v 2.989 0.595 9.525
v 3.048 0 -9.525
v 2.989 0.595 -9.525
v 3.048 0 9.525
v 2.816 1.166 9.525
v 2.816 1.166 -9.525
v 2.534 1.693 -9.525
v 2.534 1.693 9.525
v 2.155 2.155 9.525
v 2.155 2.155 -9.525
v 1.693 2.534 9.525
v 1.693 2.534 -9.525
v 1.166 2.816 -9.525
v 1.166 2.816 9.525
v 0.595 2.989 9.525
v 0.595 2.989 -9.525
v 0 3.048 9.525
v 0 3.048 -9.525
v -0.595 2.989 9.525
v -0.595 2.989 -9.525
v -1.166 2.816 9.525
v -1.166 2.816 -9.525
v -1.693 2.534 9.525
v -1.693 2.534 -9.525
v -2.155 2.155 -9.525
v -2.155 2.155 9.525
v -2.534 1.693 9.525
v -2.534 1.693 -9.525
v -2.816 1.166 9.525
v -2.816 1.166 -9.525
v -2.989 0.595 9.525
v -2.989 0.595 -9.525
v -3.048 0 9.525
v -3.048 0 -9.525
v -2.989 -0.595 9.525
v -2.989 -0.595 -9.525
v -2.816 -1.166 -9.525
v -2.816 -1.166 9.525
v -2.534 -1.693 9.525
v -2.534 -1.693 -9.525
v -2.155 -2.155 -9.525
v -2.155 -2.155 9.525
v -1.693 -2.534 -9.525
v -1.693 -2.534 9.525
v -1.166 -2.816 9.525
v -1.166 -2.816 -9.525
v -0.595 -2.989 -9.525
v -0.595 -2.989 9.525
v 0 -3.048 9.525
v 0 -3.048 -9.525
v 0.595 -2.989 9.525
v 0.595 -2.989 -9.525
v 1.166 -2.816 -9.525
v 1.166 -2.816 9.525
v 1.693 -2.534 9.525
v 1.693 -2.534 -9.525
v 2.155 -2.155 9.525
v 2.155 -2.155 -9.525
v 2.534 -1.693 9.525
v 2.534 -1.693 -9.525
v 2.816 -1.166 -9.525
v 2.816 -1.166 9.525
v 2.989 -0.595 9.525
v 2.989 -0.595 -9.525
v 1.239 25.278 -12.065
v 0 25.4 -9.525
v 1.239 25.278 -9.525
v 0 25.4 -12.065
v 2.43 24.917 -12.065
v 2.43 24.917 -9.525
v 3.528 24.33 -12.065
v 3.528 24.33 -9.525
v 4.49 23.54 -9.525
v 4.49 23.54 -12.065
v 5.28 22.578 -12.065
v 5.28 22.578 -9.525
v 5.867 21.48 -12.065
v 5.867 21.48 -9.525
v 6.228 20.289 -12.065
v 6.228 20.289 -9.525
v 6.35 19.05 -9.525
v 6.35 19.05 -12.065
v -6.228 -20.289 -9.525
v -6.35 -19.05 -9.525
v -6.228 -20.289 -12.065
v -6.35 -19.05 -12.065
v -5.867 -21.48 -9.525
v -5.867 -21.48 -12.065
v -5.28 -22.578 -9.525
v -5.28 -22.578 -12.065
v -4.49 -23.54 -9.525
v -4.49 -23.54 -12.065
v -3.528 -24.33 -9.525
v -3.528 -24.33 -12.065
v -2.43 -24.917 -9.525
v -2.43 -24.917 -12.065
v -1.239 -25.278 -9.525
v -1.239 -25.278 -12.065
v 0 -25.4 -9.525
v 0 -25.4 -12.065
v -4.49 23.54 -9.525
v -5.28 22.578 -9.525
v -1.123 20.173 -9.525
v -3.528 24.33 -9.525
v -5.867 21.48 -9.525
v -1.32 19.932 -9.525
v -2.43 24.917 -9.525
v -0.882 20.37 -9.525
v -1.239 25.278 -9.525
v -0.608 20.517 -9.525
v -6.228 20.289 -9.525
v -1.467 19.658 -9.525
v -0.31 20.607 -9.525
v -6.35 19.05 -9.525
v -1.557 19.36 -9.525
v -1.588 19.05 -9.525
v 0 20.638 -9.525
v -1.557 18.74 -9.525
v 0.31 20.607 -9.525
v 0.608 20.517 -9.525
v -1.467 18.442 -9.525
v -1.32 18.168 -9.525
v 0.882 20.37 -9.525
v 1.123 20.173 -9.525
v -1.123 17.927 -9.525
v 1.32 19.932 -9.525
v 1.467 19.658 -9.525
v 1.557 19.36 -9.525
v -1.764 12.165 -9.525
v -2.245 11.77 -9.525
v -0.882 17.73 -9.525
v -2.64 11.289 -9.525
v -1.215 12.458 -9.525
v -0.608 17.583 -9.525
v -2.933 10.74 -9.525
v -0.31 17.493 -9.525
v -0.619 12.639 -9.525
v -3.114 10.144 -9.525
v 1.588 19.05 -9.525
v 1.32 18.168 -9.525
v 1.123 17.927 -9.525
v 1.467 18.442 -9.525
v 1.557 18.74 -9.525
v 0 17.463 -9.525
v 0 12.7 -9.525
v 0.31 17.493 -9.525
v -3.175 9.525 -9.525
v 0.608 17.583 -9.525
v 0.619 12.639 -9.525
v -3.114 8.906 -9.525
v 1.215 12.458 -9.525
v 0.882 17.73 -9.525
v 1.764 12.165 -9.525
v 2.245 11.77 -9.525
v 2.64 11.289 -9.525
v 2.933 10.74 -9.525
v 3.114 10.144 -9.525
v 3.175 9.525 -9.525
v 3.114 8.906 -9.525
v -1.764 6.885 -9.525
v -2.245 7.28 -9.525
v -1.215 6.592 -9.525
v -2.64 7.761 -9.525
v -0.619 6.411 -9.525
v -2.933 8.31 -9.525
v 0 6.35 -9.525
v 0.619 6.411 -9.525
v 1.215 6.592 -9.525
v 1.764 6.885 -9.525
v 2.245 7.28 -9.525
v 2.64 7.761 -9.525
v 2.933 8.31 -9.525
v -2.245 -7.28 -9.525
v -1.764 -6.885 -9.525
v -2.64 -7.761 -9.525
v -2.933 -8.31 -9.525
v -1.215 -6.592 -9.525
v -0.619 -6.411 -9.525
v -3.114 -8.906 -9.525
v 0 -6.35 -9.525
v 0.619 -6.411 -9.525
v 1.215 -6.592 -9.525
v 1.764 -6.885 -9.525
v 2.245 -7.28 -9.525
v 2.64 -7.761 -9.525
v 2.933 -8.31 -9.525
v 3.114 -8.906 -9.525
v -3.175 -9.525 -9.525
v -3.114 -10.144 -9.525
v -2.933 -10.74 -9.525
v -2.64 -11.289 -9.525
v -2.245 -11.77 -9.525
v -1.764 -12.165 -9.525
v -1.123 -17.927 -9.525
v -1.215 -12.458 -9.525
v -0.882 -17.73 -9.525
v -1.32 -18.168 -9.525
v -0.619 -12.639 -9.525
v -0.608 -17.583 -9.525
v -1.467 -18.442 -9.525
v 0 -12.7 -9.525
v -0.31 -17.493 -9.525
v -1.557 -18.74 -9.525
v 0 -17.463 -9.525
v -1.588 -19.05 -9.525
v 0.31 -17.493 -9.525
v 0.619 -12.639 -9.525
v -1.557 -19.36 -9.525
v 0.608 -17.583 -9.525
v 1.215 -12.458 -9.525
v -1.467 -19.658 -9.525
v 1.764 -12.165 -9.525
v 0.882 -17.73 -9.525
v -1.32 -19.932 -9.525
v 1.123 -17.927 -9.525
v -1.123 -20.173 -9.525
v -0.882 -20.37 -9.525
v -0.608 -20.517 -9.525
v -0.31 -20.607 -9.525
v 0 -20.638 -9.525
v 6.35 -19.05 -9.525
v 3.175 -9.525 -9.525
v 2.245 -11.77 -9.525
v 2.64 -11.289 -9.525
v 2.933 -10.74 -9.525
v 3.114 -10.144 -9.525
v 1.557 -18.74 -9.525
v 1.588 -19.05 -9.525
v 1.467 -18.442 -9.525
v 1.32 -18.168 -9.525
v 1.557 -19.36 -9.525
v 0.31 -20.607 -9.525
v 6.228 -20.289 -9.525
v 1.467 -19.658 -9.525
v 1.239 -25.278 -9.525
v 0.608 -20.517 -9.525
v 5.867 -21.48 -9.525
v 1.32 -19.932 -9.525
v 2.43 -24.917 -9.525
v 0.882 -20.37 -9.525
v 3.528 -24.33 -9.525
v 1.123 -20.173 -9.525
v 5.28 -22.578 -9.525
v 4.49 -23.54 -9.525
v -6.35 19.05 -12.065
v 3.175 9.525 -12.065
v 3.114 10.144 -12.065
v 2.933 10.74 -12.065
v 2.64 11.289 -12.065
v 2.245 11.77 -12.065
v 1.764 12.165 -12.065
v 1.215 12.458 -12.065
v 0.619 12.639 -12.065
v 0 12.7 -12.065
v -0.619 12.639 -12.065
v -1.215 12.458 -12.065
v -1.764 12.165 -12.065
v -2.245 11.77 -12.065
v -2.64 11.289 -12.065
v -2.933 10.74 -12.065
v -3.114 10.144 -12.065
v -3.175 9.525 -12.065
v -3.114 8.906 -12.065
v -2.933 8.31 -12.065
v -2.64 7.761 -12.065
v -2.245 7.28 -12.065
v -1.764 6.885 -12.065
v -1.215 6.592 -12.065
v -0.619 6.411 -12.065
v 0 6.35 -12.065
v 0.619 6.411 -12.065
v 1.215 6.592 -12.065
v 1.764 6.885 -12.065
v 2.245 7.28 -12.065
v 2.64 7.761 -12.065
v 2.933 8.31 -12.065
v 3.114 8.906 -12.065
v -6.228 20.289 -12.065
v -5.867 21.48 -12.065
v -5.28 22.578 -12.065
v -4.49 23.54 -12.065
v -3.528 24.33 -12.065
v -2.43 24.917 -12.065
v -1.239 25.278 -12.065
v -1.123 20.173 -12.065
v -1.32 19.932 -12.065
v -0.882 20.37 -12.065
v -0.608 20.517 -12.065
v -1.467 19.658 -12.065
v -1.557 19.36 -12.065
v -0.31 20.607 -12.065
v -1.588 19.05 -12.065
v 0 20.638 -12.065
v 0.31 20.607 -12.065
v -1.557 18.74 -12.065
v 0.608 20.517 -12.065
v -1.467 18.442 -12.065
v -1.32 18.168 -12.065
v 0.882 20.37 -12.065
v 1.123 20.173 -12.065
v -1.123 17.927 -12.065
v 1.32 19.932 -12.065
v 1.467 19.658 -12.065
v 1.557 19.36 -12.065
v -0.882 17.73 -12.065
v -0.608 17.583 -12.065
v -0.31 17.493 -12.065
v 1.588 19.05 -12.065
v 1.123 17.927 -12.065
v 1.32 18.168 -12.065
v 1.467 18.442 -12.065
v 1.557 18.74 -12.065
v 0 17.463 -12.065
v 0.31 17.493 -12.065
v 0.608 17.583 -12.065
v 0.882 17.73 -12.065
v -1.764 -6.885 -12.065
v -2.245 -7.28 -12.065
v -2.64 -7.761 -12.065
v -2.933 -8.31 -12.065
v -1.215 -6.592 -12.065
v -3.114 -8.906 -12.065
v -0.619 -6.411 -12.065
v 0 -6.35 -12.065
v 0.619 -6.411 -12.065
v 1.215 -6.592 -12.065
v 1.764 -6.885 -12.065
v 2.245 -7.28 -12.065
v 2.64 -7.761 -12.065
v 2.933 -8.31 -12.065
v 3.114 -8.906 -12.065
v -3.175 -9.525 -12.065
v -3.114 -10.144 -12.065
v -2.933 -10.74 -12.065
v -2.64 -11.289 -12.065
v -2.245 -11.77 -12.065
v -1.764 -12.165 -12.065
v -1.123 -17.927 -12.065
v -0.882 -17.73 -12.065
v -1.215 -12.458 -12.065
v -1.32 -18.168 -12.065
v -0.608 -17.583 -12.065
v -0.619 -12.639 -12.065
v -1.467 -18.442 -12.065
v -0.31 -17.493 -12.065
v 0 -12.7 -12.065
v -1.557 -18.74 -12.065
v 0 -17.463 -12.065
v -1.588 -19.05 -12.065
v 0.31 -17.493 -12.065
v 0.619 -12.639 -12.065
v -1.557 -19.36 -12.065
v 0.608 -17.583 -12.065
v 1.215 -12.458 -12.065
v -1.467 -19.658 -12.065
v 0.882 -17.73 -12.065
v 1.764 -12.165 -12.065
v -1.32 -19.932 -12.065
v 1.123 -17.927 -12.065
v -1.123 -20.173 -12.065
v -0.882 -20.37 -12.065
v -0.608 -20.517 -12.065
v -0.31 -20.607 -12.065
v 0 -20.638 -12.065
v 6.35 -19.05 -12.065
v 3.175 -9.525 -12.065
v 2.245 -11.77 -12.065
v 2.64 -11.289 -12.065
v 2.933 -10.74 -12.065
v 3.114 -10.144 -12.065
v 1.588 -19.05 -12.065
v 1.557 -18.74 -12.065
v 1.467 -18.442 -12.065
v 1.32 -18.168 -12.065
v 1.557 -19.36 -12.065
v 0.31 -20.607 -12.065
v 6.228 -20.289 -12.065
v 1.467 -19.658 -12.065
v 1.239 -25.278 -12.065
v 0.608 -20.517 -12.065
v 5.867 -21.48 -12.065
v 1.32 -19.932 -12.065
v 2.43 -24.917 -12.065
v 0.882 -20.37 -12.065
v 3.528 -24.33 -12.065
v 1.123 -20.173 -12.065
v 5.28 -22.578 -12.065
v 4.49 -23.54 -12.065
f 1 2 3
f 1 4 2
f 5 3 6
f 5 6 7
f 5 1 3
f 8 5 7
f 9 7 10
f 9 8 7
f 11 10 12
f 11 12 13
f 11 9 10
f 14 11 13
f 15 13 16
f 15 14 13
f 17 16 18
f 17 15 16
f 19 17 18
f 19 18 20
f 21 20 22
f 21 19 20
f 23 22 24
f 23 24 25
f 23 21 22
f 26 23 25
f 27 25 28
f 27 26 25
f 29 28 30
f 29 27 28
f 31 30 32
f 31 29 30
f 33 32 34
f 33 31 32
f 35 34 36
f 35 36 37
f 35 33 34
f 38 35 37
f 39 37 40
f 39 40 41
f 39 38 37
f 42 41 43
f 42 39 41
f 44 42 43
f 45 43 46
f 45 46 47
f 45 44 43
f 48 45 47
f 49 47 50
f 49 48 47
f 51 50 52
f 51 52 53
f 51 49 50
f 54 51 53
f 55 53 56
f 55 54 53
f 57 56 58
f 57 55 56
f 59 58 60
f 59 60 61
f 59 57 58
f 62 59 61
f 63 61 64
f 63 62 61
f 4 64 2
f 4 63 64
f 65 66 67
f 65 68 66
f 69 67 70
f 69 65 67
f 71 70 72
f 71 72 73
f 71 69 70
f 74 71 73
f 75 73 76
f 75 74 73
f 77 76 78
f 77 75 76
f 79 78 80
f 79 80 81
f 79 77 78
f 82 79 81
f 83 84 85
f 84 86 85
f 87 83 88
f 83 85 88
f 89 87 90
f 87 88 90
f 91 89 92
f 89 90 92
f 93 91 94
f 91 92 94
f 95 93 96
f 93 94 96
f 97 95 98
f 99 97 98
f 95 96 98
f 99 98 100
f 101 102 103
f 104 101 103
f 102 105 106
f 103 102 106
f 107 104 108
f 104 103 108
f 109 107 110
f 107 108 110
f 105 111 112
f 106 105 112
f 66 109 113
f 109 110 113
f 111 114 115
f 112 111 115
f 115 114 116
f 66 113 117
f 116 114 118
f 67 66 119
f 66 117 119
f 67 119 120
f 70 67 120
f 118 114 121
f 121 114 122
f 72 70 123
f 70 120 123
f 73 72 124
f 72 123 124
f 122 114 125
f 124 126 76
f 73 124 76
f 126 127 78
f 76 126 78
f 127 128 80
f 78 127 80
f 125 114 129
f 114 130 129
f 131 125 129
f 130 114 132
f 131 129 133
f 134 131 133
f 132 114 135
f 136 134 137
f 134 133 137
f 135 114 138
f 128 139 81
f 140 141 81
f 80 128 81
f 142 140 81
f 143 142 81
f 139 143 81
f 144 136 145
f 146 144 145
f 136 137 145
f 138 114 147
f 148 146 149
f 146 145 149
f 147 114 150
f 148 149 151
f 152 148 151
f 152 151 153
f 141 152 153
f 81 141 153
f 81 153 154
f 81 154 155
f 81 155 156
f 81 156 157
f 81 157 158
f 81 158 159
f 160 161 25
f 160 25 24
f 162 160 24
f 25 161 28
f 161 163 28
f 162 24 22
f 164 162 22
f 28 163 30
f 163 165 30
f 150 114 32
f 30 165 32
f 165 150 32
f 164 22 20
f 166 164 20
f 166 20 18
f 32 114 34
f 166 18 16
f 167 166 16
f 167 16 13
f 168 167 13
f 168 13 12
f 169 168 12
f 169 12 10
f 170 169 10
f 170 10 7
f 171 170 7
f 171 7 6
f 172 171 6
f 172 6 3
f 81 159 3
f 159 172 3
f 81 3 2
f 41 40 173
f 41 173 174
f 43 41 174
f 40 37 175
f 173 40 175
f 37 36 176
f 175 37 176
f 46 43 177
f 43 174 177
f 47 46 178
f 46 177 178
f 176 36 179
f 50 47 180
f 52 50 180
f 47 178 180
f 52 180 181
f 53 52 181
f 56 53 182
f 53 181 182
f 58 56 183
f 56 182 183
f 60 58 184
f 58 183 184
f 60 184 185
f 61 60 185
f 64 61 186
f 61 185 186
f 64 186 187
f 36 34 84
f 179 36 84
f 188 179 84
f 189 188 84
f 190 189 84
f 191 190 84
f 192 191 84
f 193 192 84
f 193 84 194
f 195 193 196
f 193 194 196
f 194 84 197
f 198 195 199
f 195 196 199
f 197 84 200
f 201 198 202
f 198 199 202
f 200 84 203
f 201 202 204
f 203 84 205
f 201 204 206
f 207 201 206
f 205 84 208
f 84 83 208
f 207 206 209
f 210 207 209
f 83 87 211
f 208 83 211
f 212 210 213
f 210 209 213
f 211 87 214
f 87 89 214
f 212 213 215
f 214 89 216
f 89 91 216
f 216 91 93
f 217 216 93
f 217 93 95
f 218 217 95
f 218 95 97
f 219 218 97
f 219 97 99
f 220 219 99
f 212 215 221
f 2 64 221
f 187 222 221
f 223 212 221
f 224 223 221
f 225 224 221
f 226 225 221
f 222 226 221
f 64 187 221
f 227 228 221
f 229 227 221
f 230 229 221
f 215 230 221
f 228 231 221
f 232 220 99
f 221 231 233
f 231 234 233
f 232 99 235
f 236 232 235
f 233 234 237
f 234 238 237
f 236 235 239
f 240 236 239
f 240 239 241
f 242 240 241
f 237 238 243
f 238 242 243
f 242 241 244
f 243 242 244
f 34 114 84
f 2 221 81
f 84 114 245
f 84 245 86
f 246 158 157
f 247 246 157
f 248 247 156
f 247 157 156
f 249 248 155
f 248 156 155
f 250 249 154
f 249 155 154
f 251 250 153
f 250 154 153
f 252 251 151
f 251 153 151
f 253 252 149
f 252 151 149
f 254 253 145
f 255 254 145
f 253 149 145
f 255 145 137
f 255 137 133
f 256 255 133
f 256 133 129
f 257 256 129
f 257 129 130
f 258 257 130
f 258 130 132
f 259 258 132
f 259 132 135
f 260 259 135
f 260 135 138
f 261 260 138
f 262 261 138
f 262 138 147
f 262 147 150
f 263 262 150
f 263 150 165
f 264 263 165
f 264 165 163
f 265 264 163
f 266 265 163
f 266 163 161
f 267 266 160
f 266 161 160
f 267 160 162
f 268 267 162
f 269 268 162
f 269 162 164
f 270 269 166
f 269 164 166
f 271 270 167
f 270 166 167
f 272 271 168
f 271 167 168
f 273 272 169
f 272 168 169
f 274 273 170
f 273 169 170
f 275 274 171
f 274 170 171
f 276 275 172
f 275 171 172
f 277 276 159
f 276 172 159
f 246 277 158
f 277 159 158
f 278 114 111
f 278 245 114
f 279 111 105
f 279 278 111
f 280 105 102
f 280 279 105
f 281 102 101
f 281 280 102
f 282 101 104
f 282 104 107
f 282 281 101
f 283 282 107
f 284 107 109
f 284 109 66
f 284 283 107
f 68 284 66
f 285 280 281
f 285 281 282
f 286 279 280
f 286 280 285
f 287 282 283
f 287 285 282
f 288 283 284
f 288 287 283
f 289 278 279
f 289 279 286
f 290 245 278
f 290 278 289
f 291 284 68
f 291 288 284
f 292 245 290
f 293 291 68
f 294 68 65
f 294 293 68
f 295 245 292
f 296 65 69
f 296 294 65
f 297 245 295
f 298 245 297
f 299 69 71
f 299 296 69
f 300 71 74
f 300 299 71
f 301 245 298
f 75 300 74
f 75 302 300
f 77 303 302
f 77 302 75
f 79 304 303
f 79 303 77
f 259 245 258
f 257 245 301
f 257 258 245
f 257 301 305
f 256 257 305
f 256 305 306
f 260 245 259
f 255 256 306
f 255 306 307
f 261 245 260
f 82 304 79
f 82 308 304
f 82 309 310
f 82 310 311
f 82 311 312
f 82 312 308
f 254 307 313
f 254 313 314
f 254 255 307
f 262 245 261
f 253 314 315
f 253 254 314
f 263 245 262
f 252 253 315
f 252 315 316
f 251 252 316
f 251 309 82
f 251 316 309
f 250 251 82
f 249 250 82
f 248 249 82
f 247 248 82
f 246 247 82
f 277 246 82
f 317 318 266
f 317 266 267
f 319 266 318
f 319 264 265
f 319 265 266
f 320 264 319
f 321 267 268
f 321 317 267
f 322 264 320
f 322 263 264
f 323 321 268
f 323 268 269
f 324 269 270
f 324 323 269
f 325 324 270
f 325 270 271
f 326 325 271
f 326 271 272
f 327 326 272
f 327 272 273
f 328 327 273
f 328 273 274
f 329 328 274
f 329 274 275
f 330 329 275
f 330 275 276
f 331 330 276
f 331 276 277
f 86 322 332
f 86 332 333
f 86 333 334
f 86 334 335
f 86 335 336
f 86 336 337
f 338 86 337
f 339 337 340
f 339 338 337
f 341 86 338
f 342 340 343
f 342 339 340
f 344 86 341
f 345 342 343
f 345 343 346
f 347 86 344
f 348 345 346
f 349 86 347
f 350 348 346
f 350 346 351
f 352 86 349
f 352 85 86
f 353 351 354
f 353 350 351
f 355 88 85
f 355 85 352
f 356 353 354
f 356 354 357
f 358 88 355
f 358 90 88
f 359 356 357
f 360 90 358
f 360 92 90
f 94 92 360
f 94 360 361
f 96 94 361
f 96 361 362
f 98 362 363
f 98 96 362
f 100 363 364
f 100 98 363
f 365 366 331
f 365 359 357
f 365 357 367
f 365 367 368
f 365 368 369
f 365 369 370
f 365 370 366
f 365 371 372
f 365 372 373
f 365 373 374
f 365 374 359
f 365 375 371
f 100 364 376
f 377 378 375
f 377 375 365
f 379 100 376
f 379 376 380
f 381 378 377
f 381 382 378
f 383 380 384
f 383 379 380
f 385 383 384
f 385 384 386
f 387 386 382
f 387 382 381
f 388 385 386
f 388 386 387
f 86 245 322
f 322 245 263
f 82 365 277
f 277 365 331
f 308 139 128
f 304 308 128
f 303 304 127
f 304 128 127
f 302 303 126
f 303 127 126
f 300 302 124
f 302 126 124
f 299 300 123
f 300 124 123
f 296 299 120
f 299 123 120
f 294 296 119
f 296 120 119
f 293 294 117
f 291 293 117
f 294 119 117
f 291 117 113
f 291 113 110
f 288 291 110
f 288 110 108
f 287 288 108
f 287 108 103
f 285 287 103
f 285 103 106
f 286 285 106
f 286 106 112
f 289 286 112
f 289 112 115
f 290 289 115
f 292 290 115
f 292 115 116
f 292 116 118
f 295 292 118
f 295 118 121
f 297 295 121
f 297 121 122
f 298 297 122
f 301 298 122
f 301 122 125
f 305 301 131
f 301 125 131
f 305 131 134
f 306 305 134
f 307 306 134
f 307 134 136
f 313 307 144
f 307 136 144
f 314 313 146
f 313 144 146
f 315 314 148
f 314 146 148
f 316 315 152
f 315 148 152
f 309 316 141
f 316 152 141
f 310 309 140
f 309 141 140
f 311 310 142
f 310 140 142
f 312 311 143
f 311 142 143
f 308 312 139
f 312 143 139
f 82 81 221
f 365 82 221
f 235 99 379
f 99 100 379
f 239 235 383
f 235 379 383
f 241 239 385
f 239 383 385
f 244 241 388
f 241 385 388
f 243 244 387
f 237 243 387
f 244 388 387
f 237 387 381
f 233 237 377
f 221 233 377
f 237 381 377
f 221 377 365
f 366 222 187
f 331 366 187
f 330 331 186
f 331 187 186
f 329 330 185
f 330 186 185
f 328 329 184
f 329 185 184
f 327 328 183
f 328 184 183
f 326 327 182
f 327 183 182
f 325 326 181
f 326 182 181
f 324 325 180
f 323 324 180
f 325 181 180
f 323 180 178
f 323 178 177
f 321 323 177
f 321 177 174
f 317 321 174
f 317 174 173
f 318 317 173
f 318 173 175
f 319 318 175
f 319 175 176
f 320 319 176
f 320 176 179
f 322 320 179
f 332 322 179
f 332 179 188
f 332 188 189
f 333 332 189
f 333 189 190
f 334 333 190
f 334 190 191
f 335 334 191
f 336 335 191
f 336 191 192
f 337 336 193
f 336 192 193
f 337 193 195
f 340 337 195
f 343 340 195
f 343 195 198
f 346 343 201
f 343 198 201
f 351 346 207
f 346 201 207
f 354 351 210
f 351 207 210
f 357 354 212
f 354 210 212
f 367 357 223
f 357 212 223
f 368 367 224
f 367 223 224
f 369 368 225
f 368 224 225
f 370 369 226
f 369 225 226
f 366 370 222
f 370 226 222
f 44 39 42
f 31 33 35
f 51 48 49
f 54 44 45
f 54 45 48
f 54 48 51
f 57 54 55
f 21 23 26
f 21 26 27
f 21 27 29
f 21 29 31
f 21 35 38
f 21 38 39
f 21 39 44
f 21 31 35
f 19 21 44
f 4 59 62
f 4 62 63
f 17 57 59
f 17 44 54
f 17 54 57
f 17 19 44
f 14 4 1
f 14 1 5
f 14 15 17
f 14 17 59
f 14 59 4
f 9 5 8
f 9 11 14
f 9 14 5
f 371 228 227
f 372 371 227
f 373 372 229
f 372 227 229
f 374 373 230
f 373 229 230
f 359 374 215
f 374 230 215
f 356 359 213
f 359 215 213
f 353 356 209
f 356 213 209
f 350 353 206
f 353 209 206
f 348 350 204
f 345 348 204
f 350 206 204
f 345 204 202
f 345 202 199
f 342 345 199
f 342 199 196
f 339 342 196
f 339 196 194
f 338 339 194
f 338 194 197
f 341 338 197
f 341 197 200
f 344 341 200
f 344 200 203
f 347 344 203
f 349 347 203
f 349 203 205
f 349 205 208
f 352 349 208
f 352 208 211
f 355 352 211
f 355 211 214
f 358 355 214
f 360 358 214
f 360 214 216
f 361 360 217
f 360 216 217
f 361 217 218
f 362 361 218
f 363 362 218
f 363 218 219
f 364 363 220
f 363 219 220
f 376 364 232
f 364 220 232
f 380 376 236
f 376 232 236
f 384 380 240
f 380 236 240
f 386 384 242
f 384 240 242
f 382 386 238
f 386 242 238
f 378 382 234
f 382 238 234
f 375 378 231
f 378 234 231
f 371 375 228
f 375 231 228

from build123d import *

# Parameters (mm, degrees)
F0_R     = 3.048
F1_DEPTH = 9.525
F2_W     = 12.7
F2_H     = 50.8
F3_DEPTH = 2.54
F4_R     = 6.34999
F5_R     = 1.5875
F5_R_2   = 3.175
F6_DEPTH = 2.541


# Not quite as in the source:
# - a fillet or chamfer is up to 0.001 mm smaller than in the source, because OpenCascade refuses the exact size


with BuildPart() as f1:
    # F0 (on Top) → F1 (new body, symmetric)
    with BuildSketch(Plane.XY):
        Circle(F0_R)
    extrude(amount=F1_DEPTH, both=True)

    # F2 (on face) → F3 (join)
    with BuildSketch(Plane(origin=(0, 0, -9.525), x_dir=(1, 0, 0), z_dir=(0, 0, -1))):
        Rectangle(F2_W, F2_H)
    extrude(amount=F3_DEPTH)

    # F4 (radius 6.35 in the source; OpenCascade refuses exactly that, so slightly less here)
    f4_edges = [f1.edges().sort_by_distance(p)[0] for p in [
        (-6.35, 25.4, -10.795),
        (6.35, 25.4, -10.795),
        (-6.35, -25.4, -10.795),
        (6.35, -25.4, -10.795),
    ]]
    fillet(f4_edges, radius=F4_R)

    # F5 (on face) → F6 (cut, through all)
    with BuildSketch(Plane.XY.offset(-9.525)):
        with Locations((0, 19.05)):
            Circle(F5_R)
        with Locations((0, 9.525)):
            Circle(F5_R_2)
        with Locations((0, -19.05)):
            Circle(F5_R)
        with Locations((0, -9.525)):
            Circle(F5_R_2)
    extrude(amount=-F6_DEPTH, mode=Mode.SUBTRACT)


solid = f1.part
